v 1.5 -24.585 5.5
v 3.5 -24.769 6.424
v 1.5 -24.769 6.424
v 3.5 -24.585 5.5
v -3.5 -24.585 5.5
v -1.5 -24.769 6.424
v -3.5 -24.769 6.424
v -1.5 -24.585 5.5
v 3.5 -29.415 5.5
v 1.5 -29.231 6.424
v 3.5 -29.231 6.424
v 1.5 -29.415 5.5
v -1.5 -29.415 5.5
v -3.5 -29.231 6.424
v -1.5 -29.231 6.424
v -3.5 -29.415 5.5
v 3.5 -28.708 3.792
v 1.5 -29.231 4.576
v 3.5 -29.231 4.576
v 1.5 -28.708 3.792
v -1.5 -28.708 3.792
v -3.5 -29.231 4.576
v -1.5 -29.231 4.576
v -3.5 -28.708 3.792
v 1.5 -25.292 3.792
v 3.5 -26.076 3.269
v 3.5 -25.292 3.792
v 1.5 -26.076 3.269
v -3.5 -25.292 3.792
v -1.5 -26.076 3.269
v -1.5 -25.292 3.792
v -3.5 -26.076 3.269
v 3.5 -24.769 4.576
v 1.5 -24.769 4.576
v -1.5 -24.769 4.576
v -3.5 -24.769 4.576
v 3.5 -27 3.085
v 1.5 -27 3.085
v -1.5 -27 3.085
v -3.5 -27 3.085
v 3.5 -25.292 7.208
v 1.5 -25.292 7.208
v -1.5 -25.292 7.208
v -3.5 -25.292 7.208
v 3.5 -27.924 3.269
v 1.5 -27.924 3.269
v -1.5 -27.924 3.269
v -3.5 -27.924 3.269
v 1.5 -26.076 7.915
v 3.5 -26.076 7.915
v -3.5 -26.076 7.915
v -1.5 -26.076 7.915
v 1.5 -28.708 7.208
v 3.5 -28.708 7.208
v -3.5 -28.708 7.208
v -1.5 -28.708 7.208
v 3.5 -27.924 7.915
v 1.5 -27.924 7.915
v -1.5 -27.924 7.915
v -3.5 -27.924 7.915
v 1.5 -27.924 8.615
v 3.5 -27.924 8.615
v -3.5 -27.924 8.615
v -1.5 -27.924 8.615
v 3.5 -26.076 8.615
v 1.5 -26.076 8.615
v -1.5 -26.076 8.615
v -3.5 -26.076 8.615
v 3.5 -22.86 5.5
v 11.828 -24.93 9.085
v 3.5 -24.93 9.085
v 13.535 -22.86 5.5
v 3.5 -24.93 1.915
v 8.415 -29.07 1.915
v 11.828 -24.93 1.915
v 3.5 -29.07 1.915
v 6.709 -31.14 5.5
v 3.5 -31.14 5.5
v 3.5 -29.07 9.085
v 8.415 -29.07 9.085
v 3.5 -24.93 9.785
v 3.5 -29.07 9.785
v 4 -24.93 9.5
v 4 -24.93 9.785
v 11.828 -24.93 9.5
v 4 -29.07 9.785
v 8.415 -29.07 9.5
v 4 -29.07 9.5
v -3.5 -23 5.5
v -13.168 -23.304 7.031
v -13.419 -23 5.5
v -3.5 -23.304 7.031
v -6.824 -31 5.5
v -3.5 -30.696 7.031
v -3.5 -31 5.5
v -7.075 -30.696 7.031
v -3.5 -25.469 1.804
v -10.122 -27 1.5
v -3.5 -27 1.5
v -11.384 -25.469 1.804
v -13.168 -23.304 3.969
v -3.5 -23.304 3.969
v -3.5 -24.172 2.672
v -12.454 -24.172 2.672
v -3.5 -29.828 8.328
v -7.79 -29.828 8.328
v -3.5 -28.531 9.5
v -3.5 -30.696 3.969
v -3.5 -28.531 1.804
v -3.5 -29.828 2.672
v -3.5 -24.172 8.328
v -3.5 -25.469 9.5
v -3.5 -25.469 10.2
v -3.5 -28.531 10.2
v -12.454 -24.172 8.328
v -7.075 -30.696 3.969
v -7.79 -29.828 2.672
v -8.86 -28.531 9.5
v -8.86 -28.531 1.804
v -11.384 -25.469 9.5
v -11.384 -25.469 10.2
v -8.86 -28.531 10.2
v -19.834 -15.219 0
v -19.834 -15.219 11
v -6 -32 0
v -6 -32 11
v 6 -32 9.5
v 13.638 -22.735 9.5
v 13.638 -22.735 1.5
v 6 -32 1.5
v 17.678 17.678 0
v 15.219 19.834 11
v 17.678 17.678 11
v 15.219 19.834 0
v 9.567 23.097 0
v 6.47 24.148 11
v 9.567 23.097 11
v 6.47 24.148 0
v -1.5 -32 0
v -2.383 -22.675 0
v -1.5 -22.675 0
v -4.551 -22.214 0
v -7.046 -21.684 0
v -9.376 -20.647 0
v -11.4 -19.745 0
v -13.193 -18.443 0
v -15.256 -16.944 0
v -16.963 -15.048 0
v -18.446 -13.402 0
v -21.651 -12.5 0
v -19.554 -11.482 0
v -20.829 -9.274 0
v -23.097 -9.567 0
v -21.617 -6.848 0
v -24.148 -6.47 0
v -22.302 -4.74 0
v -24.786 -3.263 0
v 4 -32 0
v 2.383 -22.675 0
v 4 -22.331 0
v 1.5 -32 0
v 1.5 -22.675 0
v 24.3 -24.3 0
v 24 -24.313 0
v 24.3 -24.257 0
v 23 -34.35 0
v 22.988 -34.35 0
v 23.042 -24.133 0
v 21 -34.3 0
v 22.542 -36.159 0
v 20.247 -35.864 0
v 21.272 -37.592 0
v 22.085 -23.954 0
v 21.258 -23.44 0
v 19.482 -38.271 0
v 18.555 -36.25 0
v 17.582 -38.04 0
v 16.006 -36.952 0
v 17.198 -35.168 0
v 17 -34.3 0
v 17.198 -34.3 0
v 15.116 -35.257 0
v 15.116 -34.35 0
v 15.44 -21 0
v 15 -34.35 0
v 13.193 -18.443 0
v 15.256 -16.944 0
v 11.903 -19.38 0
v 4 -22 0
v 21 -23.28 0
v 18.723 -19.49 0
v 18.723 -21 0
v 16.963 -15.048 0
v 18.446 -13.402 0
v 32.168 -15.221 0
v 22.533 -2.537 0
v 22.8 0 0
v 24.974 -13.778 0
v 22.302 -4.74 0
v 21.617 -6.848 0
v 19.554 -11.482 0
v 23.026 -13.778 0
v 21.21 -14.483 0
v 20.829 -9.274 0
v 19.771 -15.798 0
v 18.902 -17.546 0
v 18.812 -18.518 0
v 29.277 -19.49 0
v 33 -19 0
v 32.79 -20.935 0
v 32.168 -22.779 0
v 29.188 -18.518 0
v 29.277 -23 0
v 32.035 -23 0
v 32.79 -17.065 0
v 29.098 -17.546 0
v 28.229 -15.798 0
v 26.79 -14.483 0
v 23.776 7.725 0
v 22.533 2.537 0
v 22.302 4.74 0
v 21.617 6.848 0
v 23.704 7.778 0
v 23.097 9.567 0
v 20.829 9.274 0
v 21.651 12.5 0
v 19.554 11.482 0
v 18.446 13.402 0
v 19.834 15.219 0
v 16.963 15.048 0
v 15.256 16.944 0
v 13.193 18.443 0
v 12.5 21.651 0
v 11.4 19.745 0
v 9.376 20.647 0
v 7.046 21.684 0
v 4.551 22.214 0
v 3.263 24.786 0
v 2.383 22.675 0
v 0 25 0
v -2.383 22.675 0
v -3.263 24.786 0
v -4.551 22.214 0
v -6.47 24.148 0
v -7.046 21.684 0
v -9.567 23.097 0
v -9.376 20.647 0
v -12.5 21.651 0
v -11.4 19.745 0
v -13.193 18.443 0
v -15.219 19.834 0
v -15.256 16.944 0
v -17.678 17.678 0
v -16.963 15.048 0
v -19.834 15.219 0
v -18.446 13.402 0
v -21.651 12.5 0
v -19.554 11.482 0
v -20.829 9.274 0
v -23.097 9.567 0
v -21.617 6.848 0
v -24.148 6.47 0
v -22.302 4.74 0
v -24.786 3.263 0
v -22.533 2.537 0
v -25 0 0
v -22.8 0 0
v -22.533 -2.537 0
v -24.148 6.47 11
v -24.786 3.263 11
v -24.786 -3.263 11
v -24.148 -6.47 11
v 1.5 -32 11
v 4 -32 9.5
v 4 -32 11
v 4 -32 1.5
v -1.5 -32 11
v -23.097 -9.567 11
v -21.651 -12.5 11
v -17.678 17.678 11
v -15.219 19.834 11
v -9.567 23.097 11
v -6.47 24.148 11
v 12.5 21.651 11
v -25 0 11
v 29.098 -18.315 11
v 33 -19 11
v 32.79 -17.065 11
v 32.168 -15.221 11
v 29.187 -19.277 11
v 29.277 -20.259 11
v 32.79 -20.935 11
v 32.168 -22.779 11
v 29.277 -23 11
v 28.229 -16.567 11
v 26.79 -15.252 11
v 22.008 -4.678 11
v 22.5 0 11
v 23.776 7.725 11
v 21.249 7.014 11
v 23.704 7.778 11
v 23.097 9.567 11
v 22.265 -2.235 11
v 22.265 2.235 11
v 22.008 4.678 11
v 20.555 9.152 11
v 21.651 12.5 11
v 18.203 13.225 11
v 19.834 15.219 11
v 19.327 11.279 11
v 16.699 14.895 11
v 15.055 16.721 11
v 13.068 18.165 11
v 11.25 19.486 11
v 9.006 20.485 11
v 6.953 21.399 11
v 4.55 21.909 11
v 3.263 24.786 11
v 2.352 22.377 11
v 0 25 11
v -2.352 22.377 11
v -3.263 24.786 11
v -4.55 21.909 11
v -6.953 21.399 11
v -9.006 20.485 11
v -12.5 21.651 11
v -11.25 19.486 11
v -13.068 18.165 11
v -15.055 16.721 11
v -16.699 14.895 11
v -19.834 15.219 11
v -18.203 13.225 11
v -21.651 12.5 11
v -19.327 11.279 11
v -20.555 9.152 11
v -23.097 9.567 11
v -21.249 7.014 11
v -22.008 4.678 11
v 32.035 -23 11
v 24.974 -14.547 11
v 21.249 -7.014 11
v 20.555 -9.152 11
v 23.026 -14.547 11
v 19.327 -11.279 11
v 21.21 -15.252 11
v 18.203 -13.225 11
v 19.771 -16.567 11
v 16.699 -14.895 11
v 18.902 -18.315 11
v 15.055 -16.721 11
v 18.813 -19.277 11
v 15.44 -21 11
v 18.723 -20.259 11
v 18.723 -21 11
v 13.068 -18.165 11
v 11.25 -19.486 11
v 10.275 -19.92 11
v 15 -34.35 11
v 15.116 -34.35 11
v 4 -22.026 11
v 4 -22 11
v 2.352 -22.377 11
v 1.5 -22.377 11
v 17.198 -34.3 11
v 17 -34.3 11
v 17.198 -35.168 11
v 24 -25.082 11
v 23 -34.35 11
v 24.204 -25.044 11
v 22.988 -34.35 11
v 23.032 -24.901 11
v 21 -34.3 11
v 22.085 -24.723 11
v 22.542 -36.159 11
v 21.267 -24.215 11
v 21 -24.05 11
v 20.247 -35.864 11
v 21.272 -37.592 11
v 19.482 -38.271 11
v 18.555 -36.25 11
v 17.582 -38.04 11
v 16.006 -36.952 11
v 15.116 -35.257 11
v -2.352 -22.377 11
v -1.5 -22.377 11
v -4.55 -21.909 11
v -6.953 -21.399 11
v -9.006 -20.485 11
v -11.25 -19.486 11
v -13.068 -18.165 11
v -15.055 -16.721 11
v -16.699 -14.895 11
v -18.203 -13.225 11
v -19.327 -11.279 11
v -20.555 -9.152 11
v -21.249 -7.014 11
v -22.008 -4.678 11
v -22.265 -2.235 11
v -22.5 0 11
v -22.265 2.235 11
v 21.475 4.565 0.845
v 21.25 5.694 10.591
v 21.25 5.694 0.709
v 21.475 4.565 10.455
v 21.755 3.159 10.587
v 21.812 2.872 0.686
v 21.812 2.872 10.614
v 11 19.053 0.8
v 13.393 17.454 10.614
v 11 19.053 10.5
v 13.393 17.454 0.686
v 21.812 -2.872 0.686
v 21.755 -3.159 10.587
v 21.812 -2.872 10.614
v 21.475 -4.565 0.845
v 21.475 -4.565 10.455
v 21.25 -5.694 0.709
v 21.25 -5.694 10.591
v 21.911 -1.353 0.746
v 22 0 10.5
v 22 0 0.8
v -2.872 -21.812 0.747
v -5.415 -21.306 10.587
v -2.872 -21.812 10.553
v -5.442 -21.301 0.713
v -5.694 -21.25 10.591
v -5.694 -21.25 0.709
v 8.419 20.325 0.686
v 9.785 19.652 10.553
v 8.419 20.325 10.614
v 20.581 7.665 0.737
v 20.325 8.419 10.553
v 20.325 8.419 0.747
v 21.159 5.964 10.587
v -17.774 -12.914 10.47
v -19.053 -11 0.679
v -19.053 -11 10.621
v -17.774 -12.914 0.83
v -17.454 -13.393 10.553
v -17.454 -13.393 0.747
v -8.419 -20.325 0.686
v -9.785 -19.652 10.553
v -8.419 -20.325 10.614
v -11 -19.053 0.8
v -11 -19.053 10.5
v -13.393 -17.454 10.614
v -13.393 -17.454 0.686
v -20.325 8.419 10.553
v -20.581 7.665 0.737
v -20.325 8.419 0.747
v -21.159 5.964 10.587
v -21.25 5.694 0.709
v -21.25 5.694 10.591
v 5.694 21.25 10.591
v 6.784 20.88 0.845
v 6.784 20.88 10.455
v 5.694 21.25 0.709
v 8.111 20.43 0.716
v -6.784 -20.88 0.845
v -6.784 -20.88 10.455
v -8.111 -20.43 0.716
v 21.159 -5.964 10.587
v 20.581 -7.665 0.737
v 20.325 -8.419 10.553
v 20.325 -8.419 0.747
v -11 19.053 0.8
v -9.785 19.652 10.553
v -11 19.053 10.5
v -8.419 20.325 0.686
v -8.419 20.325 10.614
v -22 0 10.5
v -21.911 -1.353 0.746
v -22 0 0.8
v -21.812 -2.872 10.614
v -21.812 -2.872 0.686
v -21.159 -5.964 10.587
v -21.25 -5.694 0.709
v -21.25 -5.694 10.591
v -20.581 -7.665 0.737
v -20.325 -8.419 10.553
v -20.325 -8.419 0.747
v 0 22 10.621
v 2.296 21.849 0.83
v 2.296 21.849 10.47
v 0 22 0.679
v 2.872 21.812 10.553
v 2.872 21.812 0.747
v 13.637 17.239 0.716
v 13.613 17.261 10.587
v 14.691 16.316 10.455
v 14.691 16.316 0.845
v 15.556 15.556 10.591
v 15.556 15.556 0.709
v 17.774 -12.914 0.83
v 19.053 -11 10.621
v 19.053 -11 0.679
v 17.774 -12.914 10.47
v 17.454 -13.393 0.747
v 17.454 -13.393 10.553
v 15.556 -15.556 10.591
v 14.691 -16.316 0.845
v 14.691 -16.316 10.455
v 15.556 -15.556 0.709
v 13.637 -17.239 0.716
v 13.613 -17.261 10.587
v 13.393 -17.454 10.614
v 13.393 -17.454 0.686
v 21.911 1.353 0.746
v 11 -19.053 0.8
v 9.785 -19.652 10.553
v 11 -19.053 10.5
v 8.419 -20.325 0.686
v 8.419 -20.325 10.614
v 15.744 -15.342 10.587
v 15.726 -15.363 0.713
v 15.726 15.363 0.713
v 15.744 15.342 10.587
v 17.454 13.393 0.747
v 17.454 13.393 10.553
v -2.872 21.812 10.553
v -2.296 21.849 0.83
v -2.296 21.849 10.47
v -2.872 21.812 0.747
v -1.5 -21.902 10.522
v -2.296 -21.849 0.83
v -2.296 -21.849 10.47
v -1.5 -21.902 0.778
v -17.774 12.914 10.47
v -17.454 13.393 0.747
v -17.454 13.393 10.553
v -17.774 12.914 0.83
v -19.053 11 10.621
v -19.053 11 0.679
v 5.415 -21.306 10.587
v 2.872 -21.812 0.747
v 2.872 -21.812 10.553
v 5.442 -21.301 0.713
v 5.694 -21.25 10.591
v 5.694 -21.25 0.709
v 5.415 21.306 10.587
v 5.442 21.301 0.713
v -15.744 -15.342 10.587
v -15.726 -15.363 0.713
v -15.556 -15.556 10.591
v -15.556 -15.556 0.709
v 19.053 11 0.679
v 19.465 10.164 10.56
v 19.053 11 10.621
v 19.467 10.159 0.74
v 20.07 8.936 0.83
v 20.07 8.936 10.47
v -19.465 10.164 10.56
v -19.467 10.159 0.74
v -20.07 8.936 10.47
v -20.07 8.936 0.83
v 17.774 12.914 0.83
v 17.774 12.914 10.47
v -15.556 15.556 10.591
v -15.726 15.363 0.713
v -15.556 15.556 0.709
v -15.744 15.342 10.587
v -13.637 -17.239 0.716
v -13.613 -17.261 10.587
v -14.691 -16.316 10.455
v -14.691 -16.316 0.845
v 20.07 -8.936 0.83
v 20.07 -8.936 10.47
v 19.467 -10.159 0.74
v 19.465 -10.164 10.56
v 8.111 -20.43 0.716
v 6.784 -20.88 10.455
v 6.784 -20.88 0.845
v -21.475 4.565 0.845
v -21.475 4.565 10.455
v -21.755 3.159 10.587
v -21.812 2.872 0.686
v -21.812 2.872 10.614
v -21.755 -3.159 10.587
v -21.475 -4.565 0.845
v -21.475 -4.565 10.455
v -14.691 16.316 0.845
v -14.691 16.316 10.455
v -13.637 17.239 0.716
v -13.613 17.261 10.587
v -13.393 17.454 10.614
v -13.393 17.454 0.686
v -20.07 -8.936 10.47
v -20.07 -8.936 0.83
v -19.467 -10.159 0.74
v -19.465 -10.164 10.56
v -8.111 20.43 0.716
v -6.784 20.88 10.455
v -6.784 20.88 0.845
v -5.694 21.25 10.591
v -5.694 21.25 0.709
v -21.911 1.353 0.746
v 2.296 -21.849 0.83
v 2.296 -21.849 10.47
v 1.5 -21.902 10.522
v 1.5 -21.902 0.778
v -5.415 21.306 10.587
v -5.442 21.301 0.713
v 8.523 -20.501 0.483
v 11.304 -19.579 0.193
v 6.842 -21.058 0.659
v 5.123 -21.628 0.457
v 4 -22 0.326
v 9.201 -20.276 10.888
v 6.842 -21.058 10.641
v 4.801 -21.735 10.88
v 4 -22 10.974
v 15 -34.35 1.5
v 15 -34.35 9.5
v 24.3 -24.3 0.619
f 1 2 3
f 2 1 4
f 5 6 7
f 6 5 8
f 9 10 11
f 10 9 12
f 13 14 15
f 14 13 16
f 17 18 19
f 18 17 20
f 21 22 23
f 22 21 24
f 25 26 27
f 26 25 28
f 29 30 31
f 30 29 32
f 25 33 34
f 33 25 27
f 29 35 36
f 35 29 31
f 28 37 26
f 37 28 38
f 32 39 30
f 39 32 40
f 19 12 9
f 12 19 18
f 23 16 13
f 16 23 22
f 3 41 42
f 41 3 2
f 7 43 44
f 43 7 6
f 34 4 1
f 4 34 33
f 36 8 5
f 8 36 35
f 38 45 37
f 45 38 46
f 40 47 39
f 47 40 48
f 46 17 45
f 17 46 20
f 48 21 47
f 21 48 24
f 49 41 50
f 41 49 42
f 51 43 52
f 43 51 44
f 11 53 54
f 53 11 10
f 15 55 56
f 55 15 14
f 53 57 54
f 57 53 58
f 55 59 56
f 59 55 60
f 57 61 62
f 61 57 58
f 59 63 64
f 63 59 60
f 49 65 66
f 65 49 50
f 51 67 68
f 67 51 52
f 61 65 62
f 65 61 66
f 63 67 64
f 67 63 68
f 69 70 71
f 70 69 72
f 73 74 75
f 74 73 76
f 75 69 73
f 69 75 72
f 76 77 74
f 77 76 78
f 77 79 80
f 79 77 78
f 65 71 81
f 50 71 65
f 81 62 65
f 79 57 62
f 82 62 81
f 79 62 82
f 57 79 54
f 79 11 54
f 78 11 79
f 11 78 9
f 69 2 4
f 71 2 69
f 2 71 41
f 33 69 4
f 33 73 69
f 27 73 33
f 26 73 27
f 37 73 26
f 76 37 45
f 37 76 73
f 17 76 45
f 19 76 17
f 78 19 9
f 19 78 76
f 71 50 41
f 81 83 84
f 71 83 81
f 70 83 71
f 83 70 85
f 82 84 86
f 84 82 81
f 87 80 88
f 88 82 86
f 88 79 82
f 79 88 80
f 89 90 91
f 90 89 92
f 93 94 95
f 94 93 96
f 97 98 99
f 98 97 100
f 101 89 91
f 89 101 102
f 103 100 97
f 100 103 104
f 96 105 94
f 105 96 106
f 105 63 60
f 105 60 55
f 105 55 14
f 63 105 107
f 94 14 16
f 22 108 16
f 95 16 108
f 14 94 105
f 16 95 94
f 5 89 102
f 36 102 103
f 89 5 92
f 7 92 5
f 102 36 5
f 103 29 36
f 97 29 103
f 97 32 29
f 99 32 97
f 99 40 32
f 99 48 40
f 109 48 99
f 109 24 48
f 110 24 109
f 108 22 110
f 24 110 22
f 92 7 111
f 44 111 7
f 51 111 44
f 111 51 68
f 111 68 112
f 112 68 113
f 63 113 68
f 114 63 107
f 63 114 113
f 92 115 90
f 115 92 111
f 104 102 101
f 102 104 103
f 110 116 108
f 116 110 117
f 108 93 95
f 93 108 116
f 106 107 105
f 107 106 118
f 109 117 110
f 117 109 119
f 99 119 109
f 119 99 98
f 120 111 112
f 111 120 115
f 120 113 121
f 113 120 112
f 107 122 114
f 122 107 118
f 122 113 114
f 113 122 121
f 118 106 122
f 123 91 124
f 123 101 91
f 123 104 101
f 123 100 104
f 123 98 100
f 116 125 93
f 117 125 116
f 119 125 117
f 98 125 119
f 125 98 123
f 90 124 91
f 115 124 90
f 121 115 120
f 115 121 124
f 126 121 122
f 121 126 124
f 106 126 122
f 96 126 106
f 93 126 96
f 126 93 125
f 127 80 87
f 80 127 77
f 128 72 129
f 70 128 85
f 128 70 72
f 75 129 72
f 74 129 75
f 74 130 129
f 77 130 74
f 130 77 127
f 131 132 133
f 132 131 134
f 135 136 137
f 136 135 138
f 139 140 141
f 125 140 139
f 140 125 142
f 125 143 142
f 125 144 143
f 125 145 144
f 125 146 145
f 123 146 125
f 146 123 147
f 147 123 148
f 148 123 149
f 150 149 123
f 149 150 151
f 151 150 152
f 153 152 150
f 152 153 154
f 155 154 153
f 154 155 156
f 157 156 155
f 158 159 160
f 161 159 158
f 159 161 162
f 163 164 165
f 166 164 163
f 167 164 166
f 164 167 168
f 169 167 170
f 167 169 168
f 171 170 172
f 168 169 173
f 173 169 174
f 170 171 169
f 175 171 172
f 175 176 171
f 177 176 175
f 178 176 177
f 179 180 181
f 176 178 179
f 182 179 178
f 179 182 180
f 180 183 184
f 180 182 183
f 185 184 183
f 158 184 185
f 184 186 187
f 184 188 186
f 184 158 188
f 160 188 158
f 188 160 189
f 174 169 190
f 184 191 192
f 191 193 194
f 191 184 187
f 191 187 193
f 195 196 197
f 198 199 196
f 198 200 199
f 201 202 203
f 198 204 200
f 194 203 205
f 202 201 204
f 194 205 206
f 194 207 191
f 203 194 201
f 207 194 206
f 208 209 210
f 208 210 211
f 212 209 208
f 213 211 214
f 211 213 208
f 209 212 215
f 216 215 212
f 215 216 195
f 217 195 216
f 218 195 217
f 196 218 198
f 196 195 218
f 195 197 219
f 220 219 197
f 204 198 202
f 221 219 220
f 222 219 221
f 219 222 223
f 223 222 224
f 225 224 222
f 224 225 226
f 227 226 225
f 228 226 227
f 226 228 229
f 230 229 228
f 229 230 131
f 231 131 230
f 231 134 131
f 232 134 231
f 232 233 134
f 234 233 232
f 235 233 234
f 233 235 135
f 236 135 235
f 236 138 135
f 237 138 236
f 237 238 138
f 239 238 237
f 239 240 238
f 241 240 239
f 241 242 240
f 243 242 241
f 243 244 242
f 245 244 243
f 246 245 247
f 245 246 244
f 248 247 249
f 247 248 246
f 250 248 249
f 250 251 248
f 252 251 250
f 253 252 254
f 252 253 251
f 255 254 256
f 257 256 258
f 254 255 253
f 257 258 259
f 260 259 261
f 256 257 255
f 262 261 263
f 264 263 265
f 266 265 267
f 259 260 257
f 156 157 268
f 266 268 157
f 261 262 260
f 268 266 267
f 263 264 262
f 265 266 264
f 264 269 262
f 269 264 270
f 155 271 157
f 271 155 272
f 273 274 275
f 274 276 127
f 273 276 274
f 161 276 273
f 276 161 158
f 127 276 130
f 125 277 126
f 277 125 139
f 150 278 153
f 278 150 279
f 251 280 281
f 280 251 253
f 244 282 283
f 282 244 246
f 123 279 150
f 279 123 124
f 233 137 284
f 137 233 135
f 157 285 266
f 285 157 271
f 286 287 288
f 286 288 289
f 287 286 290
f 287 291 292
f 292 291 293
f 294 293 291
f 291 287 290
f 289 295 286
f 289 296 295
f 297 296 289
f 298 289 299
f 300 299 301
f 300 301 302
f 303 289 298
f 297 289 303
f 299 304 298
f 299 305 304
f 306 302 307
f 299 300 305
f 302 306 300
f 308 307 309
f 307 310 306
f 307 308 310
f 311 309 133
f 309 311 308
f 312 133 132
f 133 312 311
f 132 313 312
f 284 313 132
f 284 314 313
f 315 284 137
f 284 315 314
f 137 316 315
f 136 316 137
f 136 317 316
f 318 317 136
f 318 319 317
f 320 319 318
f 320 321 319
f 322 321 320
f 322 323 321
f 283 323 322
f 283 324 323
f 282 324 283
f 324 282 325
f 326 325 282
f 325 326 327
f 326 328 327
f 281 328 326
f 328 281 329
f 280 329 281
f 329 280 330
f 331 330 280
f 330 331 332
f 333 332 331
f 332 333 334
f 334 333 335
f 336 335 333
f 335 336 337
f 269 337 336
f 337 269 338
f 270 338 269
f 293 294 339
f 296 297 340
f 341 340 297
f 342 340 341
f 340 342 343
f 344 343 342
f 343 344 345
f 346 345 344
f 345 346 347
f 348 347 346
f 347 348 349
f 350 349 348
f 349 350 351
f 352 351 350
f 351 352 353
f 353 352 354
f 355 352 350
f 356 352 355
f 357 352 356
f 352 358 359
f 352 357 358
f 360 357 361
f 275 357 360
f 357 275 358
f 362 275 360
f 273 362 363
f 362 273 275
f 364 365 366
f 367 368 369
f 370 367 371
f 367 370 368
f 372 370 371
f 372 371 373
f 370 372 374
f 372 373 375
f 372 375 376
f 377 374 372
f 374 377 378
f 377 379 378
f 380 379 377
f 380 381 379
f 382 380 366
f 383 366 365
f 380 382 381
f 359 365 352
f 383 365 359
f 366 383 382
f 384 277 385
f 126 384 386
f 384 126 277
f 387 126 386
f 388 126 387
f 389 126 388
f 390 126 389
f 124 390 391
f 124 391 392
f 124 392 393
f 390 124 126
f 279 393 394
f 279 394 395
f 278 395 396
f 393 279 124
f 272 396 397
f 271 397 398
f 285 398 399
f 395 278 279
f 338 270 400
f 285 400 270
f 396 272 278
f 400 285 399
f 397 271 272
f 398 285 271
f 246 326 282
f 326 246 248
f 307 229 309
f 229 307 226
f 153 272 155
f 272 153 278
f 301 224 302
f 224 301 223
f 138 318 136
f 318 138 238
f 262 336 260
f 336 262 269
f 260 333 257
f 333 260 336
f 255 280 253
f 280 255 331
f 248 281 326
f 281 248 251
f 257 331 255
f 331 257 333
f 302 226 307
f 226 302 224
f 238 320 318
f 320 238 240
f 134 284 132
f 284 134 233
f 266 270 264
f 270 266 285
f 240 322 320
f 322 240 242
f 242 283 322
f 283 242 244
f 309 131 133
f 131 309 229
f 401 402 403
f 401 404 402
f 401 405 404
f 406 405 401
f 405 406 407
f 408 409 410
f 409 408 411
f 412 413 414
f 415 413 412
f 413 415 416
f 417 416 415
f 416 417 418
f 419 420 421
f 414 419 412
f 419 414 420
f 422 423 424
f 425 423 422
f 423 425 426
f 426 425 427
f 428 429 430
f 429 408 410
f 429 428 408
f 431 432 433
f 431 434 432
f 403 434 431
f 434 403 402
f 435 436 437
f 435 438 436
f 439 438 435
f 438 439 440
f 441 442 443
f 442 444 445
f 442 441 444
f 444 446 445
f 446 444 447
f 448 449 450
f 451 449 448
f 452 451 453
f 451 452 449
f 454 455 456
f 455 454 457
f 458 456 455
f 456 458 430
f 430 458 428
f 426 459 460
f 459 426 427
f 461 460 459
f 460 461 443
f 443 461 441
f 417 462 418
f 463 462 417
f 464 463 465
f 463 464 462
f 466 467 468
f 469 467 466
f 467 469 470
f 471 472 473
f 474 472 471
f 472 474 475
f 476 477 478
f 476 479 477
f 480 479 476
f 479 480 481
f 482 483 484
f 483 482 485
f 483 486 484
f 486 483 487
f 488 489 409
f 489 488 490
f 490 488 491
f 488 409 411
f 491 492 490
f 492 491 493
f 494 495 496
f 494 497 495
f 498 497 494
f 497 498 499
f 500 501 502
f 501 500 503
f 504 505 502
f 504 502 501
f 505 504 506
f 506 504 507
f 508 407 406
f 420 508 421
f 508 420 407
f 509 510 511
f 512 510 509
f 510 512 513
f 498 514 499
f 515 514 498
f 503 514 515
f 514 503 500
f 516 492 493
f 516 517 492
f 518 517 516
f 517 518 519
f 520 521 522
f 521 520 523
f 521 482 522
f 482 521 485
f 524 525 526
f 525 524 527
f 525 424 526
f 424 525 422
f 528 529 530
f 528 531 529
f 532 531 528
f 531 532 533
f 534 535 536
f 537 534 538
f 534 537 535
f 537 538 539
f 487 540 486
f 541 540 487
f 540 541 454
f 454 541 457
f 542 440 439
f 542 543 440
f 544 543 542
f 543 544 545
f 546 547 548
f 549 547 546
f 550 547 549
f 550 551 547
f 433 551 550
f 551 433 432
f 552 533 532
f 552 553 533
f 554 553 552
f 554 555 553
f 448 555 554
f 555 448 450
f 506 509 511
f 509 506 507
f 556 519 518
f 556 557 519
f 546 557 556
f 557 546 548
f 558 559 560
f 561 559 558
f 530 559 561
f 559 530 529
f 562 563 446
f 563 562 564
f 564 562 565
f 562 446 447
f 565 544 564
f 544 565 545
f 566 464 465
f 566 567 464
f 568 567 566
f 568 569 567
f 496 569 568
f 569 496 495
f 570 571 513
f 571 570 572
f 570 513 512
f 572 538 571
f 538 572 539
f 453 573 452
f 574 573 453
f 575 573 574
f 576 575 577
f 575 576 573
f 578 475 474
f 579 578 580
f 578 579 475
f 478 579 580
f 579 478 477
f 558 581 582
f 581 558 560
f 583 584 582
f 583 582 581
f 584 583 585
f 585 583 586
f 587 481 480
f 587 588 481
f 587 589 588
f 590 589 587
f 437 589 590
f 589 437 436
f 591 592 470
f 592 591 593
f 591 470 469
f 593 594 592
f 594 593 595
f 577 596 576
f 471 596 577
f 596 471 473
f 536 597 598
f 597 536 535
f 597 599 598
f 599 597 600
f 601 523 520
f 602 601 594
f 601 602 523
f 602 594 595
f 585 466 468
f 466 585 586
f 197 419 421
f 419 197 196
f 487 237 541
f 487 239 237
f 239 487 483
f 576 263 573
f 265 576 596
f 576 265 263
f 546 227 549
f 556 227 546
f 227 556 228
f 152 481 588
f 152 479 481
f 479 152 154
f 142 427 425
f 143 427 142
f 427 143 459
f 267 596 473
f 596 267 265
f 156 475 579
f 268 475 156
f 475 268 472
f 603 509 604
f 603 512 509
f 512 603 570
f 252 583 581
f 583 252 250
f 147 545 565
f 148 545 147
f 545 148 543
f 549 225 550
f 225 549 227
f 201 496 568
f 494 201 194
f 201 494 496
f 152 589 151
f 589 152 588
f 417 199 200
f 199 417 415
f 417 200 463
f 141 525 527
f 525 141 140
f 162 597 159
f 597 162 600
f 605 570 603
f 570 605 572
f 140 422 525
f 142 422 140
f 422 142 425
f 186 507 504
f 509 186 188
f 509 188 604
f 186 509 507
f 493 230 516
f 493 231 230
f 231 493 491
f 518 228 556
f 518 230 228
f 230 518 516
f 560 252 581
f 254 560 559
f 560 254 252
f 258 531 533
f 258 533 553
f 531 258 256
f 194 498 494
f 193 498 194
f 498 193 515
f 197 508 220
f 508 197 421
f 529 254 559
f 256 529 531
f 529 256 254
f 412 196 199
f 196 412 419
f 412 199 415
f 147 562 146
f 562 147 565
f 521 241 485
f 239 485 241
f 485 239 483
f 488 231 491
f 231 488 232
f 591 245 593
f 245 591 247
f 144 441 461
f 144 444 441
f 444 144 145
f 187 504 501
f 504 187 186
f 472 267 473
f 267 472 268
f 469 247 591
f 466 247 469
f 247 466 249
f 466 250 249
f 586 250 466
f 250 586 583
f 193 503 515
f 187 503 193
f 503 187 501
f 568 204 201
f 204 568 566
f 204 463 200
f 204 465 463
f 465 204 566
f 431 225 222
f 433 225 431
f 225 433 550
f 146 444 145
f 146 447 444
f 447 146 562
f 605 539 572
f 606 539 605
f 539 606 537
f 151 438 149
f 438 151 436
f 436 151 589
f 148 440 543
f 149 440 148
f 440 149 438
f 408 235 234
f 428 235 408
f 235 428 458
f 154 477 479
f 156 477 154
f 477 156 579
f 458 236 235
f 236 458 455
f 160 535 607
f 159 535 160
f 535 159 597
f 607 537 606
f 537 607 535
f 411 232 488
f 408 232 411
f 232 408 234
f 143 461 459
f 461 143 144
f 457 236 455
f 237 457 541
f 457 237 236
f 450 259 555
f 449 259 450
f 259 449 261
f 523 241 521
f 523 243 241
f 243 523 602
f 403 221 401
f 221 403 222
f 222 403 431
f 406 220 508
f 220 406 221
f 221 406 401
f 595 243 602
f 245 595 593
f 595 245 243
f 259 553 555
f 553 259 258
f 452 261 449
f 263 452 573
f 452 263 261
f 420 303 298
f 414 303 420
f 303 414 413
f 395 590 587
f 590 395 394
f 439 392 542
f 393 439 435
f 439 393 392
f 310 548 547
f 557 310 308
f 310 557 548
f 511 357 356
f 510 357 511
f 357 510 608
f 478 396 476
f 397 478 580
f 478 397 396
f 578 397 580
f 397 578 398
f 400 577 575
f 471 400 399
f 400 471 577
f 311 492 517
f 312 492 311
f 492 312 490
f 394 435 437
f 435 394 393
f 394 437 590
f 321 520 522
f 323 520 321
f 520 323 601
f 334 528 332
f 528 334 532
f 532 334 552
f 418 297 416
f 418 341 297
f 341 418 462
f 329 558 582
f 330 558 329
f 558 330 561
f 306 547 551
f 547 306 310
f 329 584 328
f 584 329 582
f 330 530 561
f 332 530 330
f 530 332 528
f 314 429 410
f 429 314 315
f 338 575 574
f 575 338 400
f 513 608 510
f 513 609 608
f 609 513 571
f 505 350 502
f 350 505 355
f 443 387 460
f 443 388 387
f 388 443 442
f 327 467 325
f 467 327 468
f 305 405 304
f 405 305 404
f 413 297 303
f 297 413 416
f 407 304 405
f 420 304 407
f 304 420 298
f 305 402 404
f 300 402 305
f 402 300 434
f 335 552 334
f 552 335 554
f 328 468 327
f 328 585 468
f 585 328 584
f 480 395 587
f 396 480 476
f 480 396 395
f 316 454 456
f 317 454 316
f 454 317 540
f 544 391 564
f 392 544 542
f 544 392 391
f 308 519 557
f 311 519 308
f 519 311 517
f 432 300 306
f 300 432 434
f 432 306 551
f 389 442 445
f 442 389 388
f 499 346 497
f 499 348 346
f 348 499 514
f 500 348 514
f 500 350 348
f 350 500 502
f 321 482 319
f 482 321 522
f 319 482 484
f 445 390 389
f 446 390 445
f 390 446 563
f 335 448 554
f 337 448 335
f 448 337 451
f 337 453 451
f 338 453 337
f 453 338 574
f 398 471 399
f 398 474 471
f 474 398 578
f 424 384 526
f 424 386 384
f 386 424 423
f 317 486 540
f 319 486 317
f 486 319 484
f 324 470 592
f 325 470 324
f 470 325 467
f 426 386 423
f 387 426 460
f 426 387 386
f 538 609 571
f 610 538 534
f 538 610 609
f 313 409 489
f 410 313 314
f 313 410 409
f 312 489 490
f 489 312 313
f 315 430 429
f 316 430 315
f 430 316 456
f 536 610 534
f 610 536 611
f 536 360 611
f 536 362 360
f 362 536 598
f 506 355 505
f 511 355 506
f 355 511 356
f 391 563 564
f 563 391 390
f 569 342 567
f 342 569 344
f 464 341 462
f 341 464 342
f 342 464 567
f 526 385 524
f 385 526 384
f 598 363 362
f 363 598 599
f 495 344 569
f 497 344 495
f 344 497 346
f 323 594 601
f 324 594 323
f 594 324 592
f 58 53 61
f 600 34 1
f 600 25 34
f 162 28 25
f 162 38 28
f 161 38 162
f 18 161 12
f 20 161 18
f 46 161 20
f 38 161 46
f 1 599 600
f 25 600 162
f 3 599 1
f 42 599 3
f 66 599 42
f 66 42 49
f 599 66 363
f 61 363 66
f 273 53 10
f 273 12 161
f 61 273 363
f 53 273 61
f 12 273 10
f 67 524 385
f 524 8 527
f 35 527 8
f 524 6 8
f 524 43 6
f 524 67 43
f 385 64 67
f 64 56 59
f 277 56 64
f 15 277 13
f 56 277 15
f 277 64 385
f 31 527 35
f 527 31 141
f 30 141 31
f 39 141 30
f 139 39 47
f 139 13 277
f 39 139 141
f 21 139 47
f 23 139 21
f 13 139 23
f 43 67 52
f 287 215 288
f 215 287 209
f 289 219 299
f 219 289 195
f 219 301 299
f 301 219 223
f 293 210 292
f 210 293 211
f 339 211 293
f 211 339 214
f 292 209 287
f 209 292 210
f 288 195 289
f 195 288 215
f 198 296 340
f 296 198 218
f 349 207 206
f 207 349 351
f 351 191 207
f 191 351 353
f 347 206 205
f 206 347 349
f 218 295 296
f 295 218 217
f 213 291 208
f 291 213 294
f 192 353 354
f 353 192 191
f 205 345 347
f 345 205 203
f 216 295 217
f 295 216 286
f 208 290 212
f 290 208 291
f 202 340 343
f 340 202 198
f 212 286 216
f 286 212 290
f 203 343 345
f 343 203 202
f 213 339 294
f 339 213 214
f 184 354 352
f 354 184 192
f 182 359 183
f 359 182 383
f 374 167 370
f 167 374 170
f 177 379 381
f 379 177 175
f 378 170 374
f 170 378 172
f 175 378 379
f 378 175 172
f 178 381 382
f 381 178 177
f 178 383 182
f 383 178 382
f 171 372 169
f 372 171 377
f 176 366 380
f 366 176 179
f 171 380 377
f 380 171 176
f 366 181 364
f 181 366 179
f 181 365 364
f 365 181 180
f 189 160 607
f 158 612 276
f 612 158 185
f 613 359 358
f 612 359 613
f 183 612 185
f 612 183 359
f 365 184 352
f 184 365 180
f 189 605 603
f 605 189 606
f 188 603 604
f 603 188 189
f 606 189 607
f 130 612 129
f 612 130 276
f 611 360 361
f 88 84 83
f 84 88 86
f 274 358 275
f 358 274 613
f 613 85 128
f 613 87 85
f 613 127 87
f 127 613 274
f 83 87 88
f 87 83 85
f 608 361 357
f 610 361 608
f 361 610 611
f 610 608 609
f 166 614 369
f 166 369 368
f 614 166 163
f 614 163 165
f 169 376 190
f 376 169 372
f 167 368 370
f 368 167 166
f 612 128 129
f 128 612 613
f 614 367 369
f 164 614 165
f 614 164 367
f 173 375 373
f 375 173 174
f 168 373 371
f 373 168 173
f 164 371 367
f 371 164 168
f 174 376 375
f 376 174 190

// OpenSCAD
// file: cylinder_clip.scad
use <../utilities.scad>;

module cylinder_clip(r=1,t=3,opening_angle=120,wing_length=2,wing_angle=45,flat_w=10,flat_t=3,h=10,$fn=$fn){
	union(){
		difference(){
			hull(){
				cylinder(r=r+t,$fn=$fn,h=h);
				translate([-flat_w/2,-r-flat_t,0]) cube([flat_w,0.1,h]);
			}
			cylinder(r=r,$fn=$fn,h=99999,center=true);
			cylinder(r1=r+2,r2=r,$fn=$fn,h=2,center=true);
			scale([tan(opening_angle/2),1,1]) rotate([0,0,45]) translate([0,0,-1]) cube([1,1,1]*9999);
		}
		reflect([1,0,0]) translate([sin(opening_angle/2),cos(opening_angle/2),0]*(r+t/2)) hull() repeat([sin(wing_angle),cos(wing_angle),0]*wing_length,2)
			cylinder(r=t/2,h=h,$fn=16);
			
	}
}

//cylinder_clip(r=3,t=2,flat_w=6);
union(){
	cylinder_clip(r=21,t=4.5,flat_t=10,opening_angle=100,$fn=64);
	translate([-5,-22-5-20,0]) cube([10,20,10]);
}
// file: ../standard_optomechanics/cylinder_clamp.scad
use <../utilities.scad>;
d=0.05;

//for 1 inch/25mm post clamp, an inner radius of 12.8 is good.
	
module cylinder_clamp(
	inner_r=12.8, //radius of the cylinder being clamped (ish!)
	clamp_h=11, //thicknedess of the clamp along the cylinder axis
	clamp_t=4, //thickness of the clamp radially
	flat_t=8, //how thick the bottom of the clamp is (often need to allow for the mounting bolt head here)
	flat_width=15, //width of the flat base
	mounting_bolt=4, //nominal size of mounting bolt (default is 4 for M4, 0 to disable)
	nut_trap=false,
	bevel_top=0.5, //size of 45 degree bevel on top surface
	bevel_bottom=0.8 //size of 45 degree bevel on bottom of hole
	){
	assign(
		post_r = inner_r, //poor initial choice of name!
		bolt_flat_w=10, //width of the region where the bolt is
		gap_w=3 //size of the gap that is squeezed by the bolt
	)
	difference(){
		hull(){
			cylinder(h=clamp_h,r=post_r+clamp_t,center=true,$fn=48);
			translate([0,-post_r-flat_t/2,0]) cube([flat_width,flat_t,clamp_h],center=true);
			translate([0,post_r+bolt_flat_w/2,0]) cube([12,bolt_flat_w,clamp_h],center=true);
		}
	
		cylinder(h=9999,r=post_r,center=true,$fn=48); //cylinder being clamped
		//bevels, top and bottom
		translate([0,0,-clamp_h/2]) cylinder(r1=post_r+3*bevel_bottom,r2=post_r-bevel_bottom,h=4*bevel_bottom,center=true);
		translate([0,0,clamp_h/2]) cylinder(r2=post_r+3*bevel_top,r1=post_r-bevel_top,h=4*bevel_top,center=true);
		//gap (squeezed by bolt)
		translate([0,999,0]) cube([gap_w,999*2,999],center=true); //gap
	
		//clamping bolt
		translate([gap_w/2+2,post_r+bolt_flat_w/2,0]) rotate([0,0,-90]) nut_y(4,h=999,shaft=true);
		translate([-gap_w/2-2,post_r+bolt_flat_w/2,0]) rotate([0,0,90]) cylinder_with_45deg_top(r=4,h=999,$fn=16); //counterbore for nut head
	
		if(mounting_bolt > 0){
			//mounting bolt
			translate([0,-post_r-4.5,0]) rotate([-90,0,0]){
				intersection(){
					rotate([90,0,0])
						if(nut_trap){
							nut_y(mounting_bolt,fudge=1.15,shaft=true,h=999);
						}else{
							screw_y(mounting_bolt,fudge=1.07,shaft=true,h=999);
						}
					cube([inner_r*2,inner_r*2,clamp_h*2],center=true);
				}
			}
		}
		//in the case of thick clamps with thin flats, this keeps the bottom flat
		translate([0,-inner_r-flat_t-999,0]) cube([9999,999*2,9999],center=true);
	}
}

module cylinder_clamp_v(
	inner_r=12.8, //radius of the cylinder being clamped (ish!)
	clamp_h=10, //width of the clamp along the cylinder (y) axis
	clamp_t=4, //thickness of the clamp radially
	flat_t=8, //how thick the bottom of the clamp is (often need to allow for the mounting bolt head here)
	flat_width=15, //width of the flat base
	mounting_bolt=4, //nominal size of mounting bolt (default is 4 for M4, 0 to disable)
	bevel=0.5 //put a 45 degree bevel on the edges of the hole
	){
	assign(
		post_r = inner_r, //poor initial choice of name!
		bolt_flat_w=11, //width of the region where the bolt is
		gap_w=2*inner_r*sin(45/2),//sin(acos(1-(9/2-4/2*1.22)/inner_r))*inner_r //size of the gap that is squeezed by the bolt
		bolt_z = inner_r+4/2*1.22+d //position of bolt (so bolt just clears the cylinder we're clamping
	)assign( //the second assign statement allows us to use gap_w
		bolt_span=gap_w+4+d//max(2*inner_r*sin(acos(1-(9/2-4/2*1.22)/inner_r)), gap_w+4)
	)
	difference(){
		hull(){
			rotate([90,0,0]) cylinder(h=clamp_h,r=inner_r+clamp_t,center=true,$fn=48);
			translate([0,0,-inner_r-flat_t/2]) cube([flat_width,clamp_h,flat_t],center=true);
			translate([0,0,bolt_z]) cube([gap_w+9,clamp_h,bolt_flat_w],center=true);
		}
	
		cylinder_with_45deg_top(h=9999,r=post_r,center=true,$fn=48); //cylinder being clamped
		reflect([0,1,0]) translate([0,clamp_h/2,0]) rotate([90,0,0]) cylinder(r1=post_r+3*bevel,r2=post_r-bevel,h=4*bevel,center=true); //bevel
		translate([0,0,999]) cube([gap_w,999,999*2],center=true); //gap
	
		//clamping bolt
		translate([bolt_span/2,0,bolt_z]) rotate([0,0,-90]) nut_y(4,h=999,shaft=true);
		translate([-bolt_span/2,0,bolt_z]) rotate([0,0,90]) cylinder_with_45deg_top(r=4,h=999,$fn=16); //counterbore for nut head
	
		if(mounting_bolt > 0){
			//mounting bolt
			translate([0,0,-post_r-4.5]){
				cylinder(r=mounting_bolt*1.1,h=post_r,$fn=16);
				cylinder(r=mounting_bolt/2*1.22,h=flat_t*2,center=true,$fn=16);
			}
		}
		translate([0,0,-inner_r-flat_t-999]) cube([9999,9999,999*2],center=true);
	}
}

translate([0,30,0]) cylinder_clamp_v(30.5/2, 10, flat_width=24, mounting_bolt=4, flat_t=8);

cylinder_clamp(30.5/2, flat_width=24, mounting_bolt=4, flat_t=8,nut_trap=true);
// main file
use <../standard_optomechanics/cylinder_clamp.scad>;
use <./cylinder_clip.scad>;
use <../utilities.scad>;

t = 3;
h = 11;
inner_r = 22;
rack_r = 5+0.3;

rack = [inner_r+2,-inner_r+3,0];

d=0.05;

module rack(){
	translate(rack) rotate([0,4,-90]) //rotate([0,2.5,-90])
				cylinder(r=rack_r,h=999*2,center=true);
}

union(){
	translate([0,0,h/2]) mirror([0,1,0]) cylinder_clamp(inner_r=inner_r,clamp_h=h,flat_width=0,flat_t=t,mounting_bolt=0,clamp_t=t);

	difference(){
		union(){
			hull(){
				rotate(18) translate([inner_r+t/2,0,0]) cylinder(r=t/2,h=h);
				translate(rack) cylinder(r=5+4,h=h);
			}
		}
	
		cylinder(r=inner_r+t/2,h=999,center=true); //clearance for tube 

		//clearance for rack
		hull() repeat([0,-999,0],2) #rack();
		translate(rack + [0,-4-999,0]) cube([1,1,1]*999*2,center=true);
		translate(rack + [0,-2,-1]) mirror([1,0,0]) mirror([0,1,0]) cube([1,1,1]*999);
	}
}

roc=2;
flex_t=2;
clip = [3,rack_r-4,h];
pivot = rack + [-clip[0]-roc, -rack_r - 10,0];
module clip_strut(h){
    hull(){
        translate(pivot + [-roc-flex_t,-d,0]) cube([flex_t,d,h]);
        translate([rack[0]-clip[0]-rack_r-flex_t-0.5,rack[1],0]) cube([flex_t,d,h]);
    }
}

difference(){
    union(){
        translate(rack) hull(){ //locking bit
            translate([-clip[0],-rack_r,0]) cube([rack_r-2,rack_r-4,h]);
            translate([-clip[0],-rack_r-10-d,0]) cube([flex_t,d,h]);
        }
        translate(pivot) difference(){
            cylinder(r=4,h=h);
            cylinder(r=2,h=999,center=true);
            translate([-10,0,-10]) cube([1,1,1]*999);
        }
        clip_strut(h);
        repeat([0,0,h-1.5],2) hull(){
            clip_strut(1.5);
            translate([4,-inner_r-10,0]) cube([d,10,1.5]);
        }
    }
    rack();
}

/*
null()	difference(){
	//	hull(){
//			translate(rack - [
		cylinder(r=inner_r+1,h=999,center=true);
		translate([inner_r,inner_r,0]) repeat([999,0,0],2) rotate([-2.5,0,-90])
				translate([0,0,-999]) cylinder(r=5+0.2,h=999*2,center=true);
	}
	difference(){
		translate([4,0,-h/2]) cube([inner_r-4-1,inner_r+10,h]); //support for clip
		cylinder(r=inner_r+t/2,h=999,center=true); //clearance for tube 
		translate([0,0,-8/2]) cube([14,999,8+0.3]); //nut entry
		translate([0,inner_r+5,0]) rotate(-90) cylinder_with_45deg_top(r=2.5,h=20,$fn=16); //bolt clearance
	}
}
*/
